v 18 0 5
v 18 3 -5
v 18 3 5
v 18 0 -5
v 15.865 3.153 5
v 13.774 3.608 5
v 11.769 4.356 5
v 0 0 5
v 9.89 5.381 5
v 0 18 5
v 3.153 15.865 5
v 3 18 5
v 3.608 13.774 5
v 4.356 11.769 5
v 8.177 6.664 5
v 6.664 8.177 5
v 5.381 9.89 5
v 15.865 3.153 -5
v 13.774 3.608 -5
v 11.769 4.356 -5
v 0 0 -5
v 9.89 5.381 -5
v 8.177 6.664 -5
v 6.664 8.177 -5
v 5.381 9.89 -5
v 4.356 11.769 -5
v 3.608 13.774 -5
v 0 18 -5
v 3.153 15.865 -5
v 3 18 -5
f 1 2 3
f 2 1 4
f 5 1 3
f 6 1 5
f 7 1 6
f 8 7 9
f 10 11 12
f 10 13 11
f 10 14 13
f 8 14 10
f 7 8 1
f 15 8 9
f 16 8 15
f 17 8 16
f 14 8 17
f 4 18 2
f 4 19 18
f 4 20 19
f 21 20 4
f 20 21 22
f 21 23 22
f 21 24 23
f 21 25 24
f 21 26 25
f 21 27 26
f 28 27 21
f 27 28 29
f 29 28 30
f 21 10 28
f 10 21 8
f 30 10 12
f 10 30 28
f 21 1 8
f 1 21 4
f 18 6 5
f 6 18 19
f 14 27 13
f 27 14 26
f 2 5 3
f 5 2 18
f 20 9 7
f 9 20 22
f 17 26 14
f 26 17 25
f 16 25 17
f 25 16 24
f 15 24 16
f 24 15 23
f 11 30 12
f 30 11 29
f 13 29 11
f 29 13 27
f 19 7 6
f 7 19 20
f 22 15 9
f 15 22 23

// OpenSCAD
// file: attach.scad
//---------------------------------------------------------------
//-- Openscad Attachment library
//-- Attach parts easily. Make your designs more reusable and clean
//---------------------------------------------------------------
//-- This is a component of the obiscad opescad tools by Obijuan
//-- (C) Juan Gonzalez-Gomez (Obijuan)
//-- Sep-2012
//---------------------------------------------------------------
//-- Released under the GPL license
//---------------------------------------------------------------

use <vector.scad>

//--------------------------------------------------------------------
//-- Draw a connector
//-- A connector is defined a 3-tuple that consist of a point
//--- (the attachment point), and axis (the attachment axis) and
//--- an angle the connected part should be rotate around the 
//--  attachment axis
//--
//--- Input parameters:
//--
//--  Connector c = [p , n, ang] where:
//--
//--     p : The attachment point
//--     v : The attachment axis
//--   ang : the angle
//--------------------------------------------------------------------
module connector(c)
{
  //-- Get the three components from the connector
  p = c[0];
  v = c[1];
  ang = c[2];

  //-- Draw the attachment poing
  color("Gray") point(p);

  //-- Draw the attachment axis vector (with a mark)
  translate(p)
    rotate(a=ang, v=v)
    color("Gray") vector(unitv(v)*6, l_arrow=2, mark=true);
}


//-------------------------------------------------------------------------
//--  ATTACH OPERATOR
//--  This operator applies the necesary transformations to the 
//--  child (attachable part) so that it is attached to the main part
//--  
//--  Parameters
//--    a -> Connector of the main part
//--    b -> Connector of the attachable part
//-------------------------------------------------------------------------
module attach(a,b)
{
  //-- Get the data from the connectors
  pos1 = a[0];  //-- Attachment point. Main part
  v    = a[1];  //-- Attachment axis. Main part
  roll = a[2];  //-- Rolling angle
  
  pos2 = b[0];  //-- Attachment point. Attachable part
  vref = b[1];  //-- Atachment axis. Attachable part
                //-- The rolling angle of the attachable part is not used

  //-------- Calculations for the "orientate operator"------
  //-- Calculate the rotation axis
  raxis = cross(vref,v);
    
  //-- Calculate the angle between the vectors
  ang = anglev(vref,v);
  //--------------------------------------------------------.-

  //-- Apply the transformations to the child ---------------------------

  //-- Place the attachable part on the main part attachment point
  translate(pos1)
    //-- Orientate operator. Apply the orientation so that
    //-- both attachment axis are paralell. Also apply the roll angle
    rotate(a=roll, v=v)  rotate(a=ang, v=raxis)
      //-- Attachable part to the origin
      translate(-pos2)
	child(0); 
}


//--------------------------------------------------------------------
//---   An example of the attach operator
//---  
//---  There are two parts: the main body and an arm
//---  They both are cubes (for simplicity)
//---
//--   In the main body there are 2 connectors defined, so that
//--  the arm can be attached to any of them (or both if you like)
//------------------------------------------------------------------

//-- In the debug mode the connectors and additional information
//-- are shown
debug=true;

//-- Define the Main part: A cube
//-- Two attachment points are defined: one on the top, another in the
//--- left side
size = [10,10,10];

//-- Connectors defined:

//--     Att. point       Att. Axis  Roll
c1 = [ [0,0,size[2]/2],  [0,0,1],     20];  //-- Connector on the top
c2 = [ [-size[0]/2,0,0], [-1,0,0],    90];  //-- Connector on the left


//-- Draw the main part along with the connectors (for debugging)
cube(size,center=true);

//-- In debug mode: Draw the main part connectors!
if (debug) {
  connector(c1);
  connector(c2);
}

//-- Define the Attachable part. It is another cube, with one connector
asize = [5,20,3];
a = [ [0,asize[1]/2-3,-asize[2]/2], [0,0,1], 0  ];


//-- Do the attach!
//-- Just change c1 by c2 to attach the part to the other 
//-- connector. Super-easy!! :-)
//-- Modify the c1 and c2 roll angle for rotating the attachable
//--  part to the desired orientation
attach(c1,a)
  //-- This is the attachable part! 
  union() {
    cube(asize,center=true);  //-- The part

    //-- In debug mode show additional info:
    if (debug) {
      frame(l=10);    //-- The part frame of reference.
      connector(a);   //-- Show the part connector
    }
  };

  
// main file
//---------------------------------------------------------------
//-- Openscad Bevel library
//-- Bevel the edges or add buttress to your parts!
//---------------------------------------------------------------
//-- This is a component of the obiscad opescad tools by Obijuan
//-- (C) Juan Gonzalez-Gomez (Obijuan)
//-- Sep-2012
//---------------------------------------------------------------
//-- Released under the GPL license
//---------------------------------------------------------------
use <vector.scad>
use <attach.scad>

//-----------------------------------------------------------------
//- Rotate a vector an angle teta around the axis given by the
//-- unit vector k
//-----------------------------------------------------------------
function Rot_axis_ang(p,k,teta) =
  p*cos(teta) + cross(k,p*sin(teta)) + k*dot(k,p)*(1-cos(teta));

//-- Transformation defined by rotating vfrom vector to vto
//-- It is applied to vector v
//-- It returns the transformed vector
function Tovector(vfrom, vto, v) = 
   Rot_axis_ang(v, unitv(cross(vfrom,vto)), anglev(vfrom,vto));

//-- Auxiliary function for extending a vector of 3 components to 4
function ev(v,c=0) = [v[0], v[1], v[2], c];

//-- Calculate the determinant of a matrix given by 3 row vectors
function det(a,b,c) = 
   a[0]*(b[1]*c[2]-b[2]*c[1])
 - a[1]*(b[0]*c[2]-b[2]*c[0])  
 + a[2]*(b[0]*c[1]-b[1]*c[0]);


//-- Sign function. It only returns 2 values: -1 when x is negative,
//-- or 1 when x=0 or x>0
function sign2(x) = sign(x)+1 - abs(sign(x));

//--------------------------------------------------------------------
//-- Beveled concave corner
//-- NOT AN INTERFACE MODULE (The user should call bconcave_corner instead)
//--
//-- Parameters:
//--   * cr: Corner radius
//--   * cres: Corner resolution
//--   * l: Length
//-    * th: Thickness
//--------------------------------------------------------------------
module bconcave_corner_aux(cr,cres,l,th)
{
  
  //-- vector for translating the  main cube
  //-- so that the top rigth corner is on the origin
  v1 = -[(cr+th)/2, (cr+th)/2, 0];

  //-- The part frame of reference is on the
  //-- internal corner
  v2 = [cr,cr,0];

  //-- Locate the frame of ref. in the internal
  //-- corner
  translate(v2)
  difference() {

    //-- Main cube for doing the corner
    translate(v1)
        //color("yellow",0.5)
        cube([cr+th, cr+th, l],center=true);
 
    //-- Cylinder used for beveling...
    cylinder(r=cr, h=l+1, center=true, $fn=4*(cres+1));
  }
}


//-----------------------------------------------------------------------------
//-- API MODULE
//--
//-- Beveled concave corner
//--
//-- Parameters:
//--   * cr: Corner radius
//--   * cres: Corner resolution
//--   * l: Length
//-    * th: Thickness
//--   * ext_corner: Where the origin is locate. By default it is located
//--       in the internal corner (concave zone). If true, 
//--       it will be in the external corner (convex zone)
//----------------------------------------------------------------------------
module bconcave_corner(cr=1,cres=4,th=1,l=10,ext_corner=false)
{
  //-- Locate the origin in the exterior edge
  if (ext_corner==true)
    translate([th,th,0]) 
      bconcave_corner_aux(cr,cres,l,th);
  else
     //-- Locate the origin in the interior edge
     translate([0.01, 0.01,0])
       bconcave_corner_aux(cr,cres,l,th);
}

//----------------------------------------------------------------------
//-- Auxiliary module (NOT FOR THE USER!)
//-- It is and standar "attach", particularized for placing concave
//-- corners
//----------------------------------------------------------------------
module bconcave_corner_attach_final(
        cfrom,  //-- Origin connector
        cto,    //-- Target connector
        cr,
        cres,
        l,
        th,
        ext_corner)
{
 
  //-- This block represent an attach operation
  //-- It is equivalent to:  attach(cto,cfrom)
  translate(cto[0])
    rotate(a=cto[2], v=cto[1])
      rotate(a=anglev(cfrom[1],cto[1]), 
             v=cross(cfrom[1],cto[1]) )
        translate(-cfrom[0]) 

  //-- Place the concave corner (along with some debug information)
  union() {
    //color("Blue")
    //connector(cfrom);
    //connector([cfrom[0],cnormal_v,0]);
    bconcave_corner(cr=cr,
             cres=cres, 
             l=l,
             th=th,
             ext_corner=ext_corner);
  }
}


//-------------------------------------------------------------------------
//-- Auxiliary module (NOT FOR THE USER!)
//-- It is the general module for performing the bconcave corner attach
//-- All the parameters should be passed to it
//--
//--  External connectors are where de concave corner will be placed. They
//--  are provided by the user
//--
//--  Internal connectors refers to the connectors of the concave corner
//--
//--  Then an attach between the internal and external connectors is done
//-------------------------------------------------------------------------
module bconcave_corner_attach_aux(

         //-- External connectors
         edge_c, 
         normal_c,

         //-- Internal connectors
         iedge_c,
         inormal_c,

	 //-- Other params
         cr,
         cres,
         th,
         l,
         ext_corner)

{
  //-- Get the Corner vectors from the internal connectors
  cedge_v = iedge_c[1];         //-- Corner edge vector
  cnormal_v = inormal_c[1];     //-- Corner normal vector

  //-- Get the vector paralell and normal to the edge
  //-- From the external connectors
  edge_v = edge_c[1];      //-- Edge verctor
  enormal_v = normal_c[1]; //-- Edge normal vector

  //---------------------------------------------------------------
  //-- For doing a correct attach, first the roll angle for the  
  //-- external connector should be calculated. It determines the
  //-- orientation of the concave corner around the edge vector
  //--
  //-- This orientation is calculated using the edge normal vectors
  //-- that bisec the corner
  //--
  //-- There are 2 different cases: depending on the relative angle
  //-- between the internal and external edges. They can be parallel
  //-- or not
  //-----------------------------------------------------------------
  //-- The roll angle has two components: the value and the sign

  //-- Calculate the sign of the rotation (the sign of roll)
  s=sign2(det(cnormal_v,enormal_v,edge_v));

  //-- Calculate the roll when the edges are paralell
  rollp = s*anglev(cnormal_v, enormal_v);

  //-- Calculate the roll in the general case
  Tcnormal_v = Tovector(cedge_v, edge_v, cnormal_v);
  rollg=s*anglev(Tcnormal_v, enormal_v);

  //-- For the paralell case... use rollp
  if (mod(cross(cedge_v,edge_v))==0) {
    //echo("Paralell");

     //-- Place the concave bevel corner!
     bconcave_corner_attach_final(
       cfrom = [[0,0,0],   cedge_v,   0],
       cto   = [edge_c[0], edge_c[1], rollp],
       cr    = cr,
       cres  = cres,
       l     = l,
       th    = th,
       ext_corner = ext_corner);
  }

  //-- For the general case, use rollg
  else {
    //echo("not paralell");

     //-- Place the concave bevel corner!
     bconcave_corner_attach_final(
       cfrom = [[0,0,0],   cedge_v,   0],
       cto   = [edge_c[0], edge_c[1], rollg],
       cr    = cr,
       cres  = cres,
       l     = l,
       th    = th,
       ext_corner = ext_corner);
  }
}

//---------------------------------------------------------------------------
//-- API MODULE
//--
//--  Bevel an edge. A concave corner is located so that the calling 
//--  module can easily perform a difference() operation
//--
//--  Two connectors are needed:
//--    * edge_c   : Connector located on the edge, paralell to the edge
//--    * normal_c : Connector located on the same point than edge_c 
//--                 pointing to the internal corner part, in the direction
//--                 of the corner bisector
//--    * cr        : Corner radius
//--    * cres      : Corner resolution
//--    * l         : Corner length
//--------------------------------------------------------------------------  
module bevel(
           edge_c, 
           normal_c,
           cr=3,
           cres=3,
           l=5)
{

  //-- Call the general module with the correct internal connectors
  bconcave_corner_attach_aux(

         //-- External connectors
         edge_c   = edge_c,
         normal_c = normal_c,

	 //-- Internal connectors 
         iedge_c   = [[0,0,0], unitv([0,0,1]), 0],
         inormal_c = [[0,0,0], [-1,-1,0]       , 0],

         //-- The other params
         cr=cr,
         cres=cres,
         l=l,
         th=1,
         ext_corner=false);
}


//---------------------------------------------------------------------------
//-- API MODULE
//--
//--  Attach a Beveled concave corner
//--  Two connectors are needed:
//--    * edge_c   : Connector located on the edge, paralell to the edge
//--    * normal_c : Connector located on the same point than edge_c 
//--                 pointing to the internal corner part, in the direction
//--                 of the corner bisector
//--    * cr        : Corner radius
//--    * cres      : Corner resolution
//--    * l         : Corner length
//--    * th        : Corner thickness (not visible when ext_corner=false)
//--    * ext_corner: If the exterior corner is used as a reference
//--------------------------------------------------------------------------  
module bconcave_corner_attach(
           edge_c, 
           normal_c,
           cr=3,
           cres=3,
           l=5, 
           th=1,
           ext_corner=false)
{

  //-- Call the general module with the correct internal connectors
  bconcave_corner_attach_aux(

         //-- External connectors
         edge_c   = edge_c,
         normal_c = normal_c,

	 //-- Internal connectors 
         iedge_c   = [[0,0,0], unitv([0,0,1]), 0],
         inormal_c = [[0,0,0], [1,1,0]       , 0],

         //-- The other params
         cr=cr,
         cres=cres,
         l=l,
         th=th,
         ext_corner=ext_corner);

}
  
//-----------------------------------------------------------
//---   TEST MODULES
//-----------------------------------------------------------

//-----------------------------------------------------------------
//--  Testing the Bevel operator... All the 12 edges of a cube
//--  are beveled. All the cases are covered, so it is a good
//--  test for finding bugs!
//----------------------------------------------------------------
module Test1_beveled_cube()
{
  //-------- Main object
  size=[30,30,30];


  //-- Define all the edges connectors
  ec1 = [[size[0]/2, 0,size[2]/2], [0,1,0], 0];
  en1 = [ec1[0],                   [1,0,1], 0];

  ec2 = [[-size[0]/2, 0,size[2]/2], [0,1,0], 0];
  en2 = [ec2[0],                   [-1,0,1], 0];

  ec3 = [[-size[0]/2, 0,-size[2]/2], [0,1,0], 0];
  en3 = [ec3[0],                   [-1,0,-1], 0];

  ec4 = [[size[0]/2, 0,-size[2]/2], [0,1,0], 0];
  en4 = [ec4[0],                   [1,0,-1], 0];

  ec5 = [[0, size[0]/2,size[2]/2], [1,0,0], 0];
  en5 = [ec5[0],                   [0,1,1], 0];

  ec6 = [[0, -size[0]/2,size[2]/2], [1,0,0], 0];
  en6 = [ec6[0],                   [0,-1,1], 0];

  ec7 = [[0, -size[0]/2,-size[2]/2], [1,0,0], 0];
  en7 = [ec7[0],                   [0,-1,-1], 0];

  ec8 = [[0, size[0]/2,-size[2]/2], [1,0,0], 0];
  en8 = [ec8[0],                    [0,1,-1], 0];

  ec9 = [[size[2]/2, size[0]/2,0 ], [0,0,1], 0];
  en9 = [ec9[0],                    [1,1,0], 0];

  ec10 = [[size[2]/2, -size[0]/2,0 ], [0,0,1], 0];
  en10 = [ec10[0],                    [1,-1,0], 0];

  ec11 = [[-size[2]/2, -size[0]/2,0 ], [0,0,1], 0];
  en11 = [ec11[0],                    [-1,-1,0], 0];

  ec12 = [[-size[2]/2, size[0]/2,0 ], [0,0,1], 0];
  en12 = [ec12[0],                    [-1,1,0], 0];


  //-- for Debuging... Show a specefic connector
  *connector(ec12);
  *connector(en12);

  //-- Parameters for all the beveled edges
  //-- It can be changed for testing
  cr=2;
  cres=0;

  //-- Remove from the main cube the concave corner parts
  difference() {

    //-- Draw the main cube
    cube(size,center=true); 

    //-- Attach the concave corners for beveling!
    bevel(ec1,en1,cr=cr,cres=0, l=size[1]+2);
    bevel(ec2,en2,cr=cr,cres=0, l=size[1]+2);
    bevel(ec3,en3,cr=cr,cres=0, l=size[1]+2);
    bevel(ec4,en4,cr=cr,cres=0, l=size[1]+2);

    bevel(ec5,en5,cr=cr,cres=0, l=size[0]+2);
    bevel(ec6,en6,cr=cr,cres=0, l=size[0]+2);
    bevel(ec7,en7,cr=cr,cres=0, l=size[0]+2);
    bevel(ec8,en8,cr=cr,cres=0, l=size[0]+2);

    bevel(ec9,en9,cr=cr,cres=0, l=size[0]+2);
    bevel(ec10,en10,cr=cr,cres=0, l=size[0]+2);
    bevel(ec11,en11,cr=cr,cres=0, l=size[0]+2);
    bevel(ec12,en12,cr=cr,cres=0, l=size[0]+2);

  }
}

//----------------------------------------------------------------
//-- Testing the bconcave_corner_attach operator
//-- It is used for adding buttress between two ortogonal parts
//----------------------------------------------------------------
module Test2_buttress()
{
  size=[30,30,30];
  th=3;
  l=2;
  cr = 6;
 

  //-- A cross. It divides the space in 4 quadrants
  difference() {  
    cube(size,center=true);
    translate([size[0]/4 + th/2, 0, size[0]/4 + th/2])
      cube([size[0]/2, size[1]+2, size[2]/2],center=true);

    translate([-size[0]/4 - th/2, 0, size[0]/4 + th/2])
      cube([size[0]/2, size[1]+2, size[2]/2],center=true);

    translate([-size[0]/4 - th/2, 0, -size[0]/4 - th/2])
      cube([size[0]/2, size[1]+2, size[2]/2],center=true);

    translate([size[0]/4 + th/2, 0, -size[0]/4 - th/2])
      cube([size[0]/2, size[1]+2, size[2]/2],center=true);
  }

  ec1 = [[th/2, size[1]/2-l/2, th/2], [0,1,0], 0];
  en1 = [ec1[0],[1,0,1],0];

  ec2 = [[th/2, -size[1]/2+l/2, th/2], [0,1,0], 0];
  en2 = [ec2[0],[1,0,1],0];

  ec3 = [[-th/2, 0, th/2], [0,1,0], 0];
  en3 = [ec3[0],[-1,0,1],0];

  ec4 = [[-th/2, 0, -th/2], [0,1,0], 0];
  en4 = [ec4[0],[-1,0,-1],0]; 

  ec5 = [[th/2, 0, -th/2], [0,1,0], 0];
  en5 = [ec5[0],[1,0,-1],0]; 

  *connector(ec5);
  *connector(en5);
 
  //-- quadrant 1:  two buttress
  bconcave_corner_attach(ec1,en1,cr, l=l, cres=0);
  bconcave_corner_attach(ec2,en2,cr, l=l, cres=0);
  
  //-- quadrant 2:  one bit buttress
  bconcave_corner_attach(ec3,en3,cr=3, l=size[1], cres=0);

  //-- quadrant 3: a Rounded buttress
  bconcave_corner_attach(ec4,en4,cr=8, l=size[1], cres=5);

  //-- Quadrant 4: A rounded buttress in the middle
  bconcave_corner_attach(ec5,en5,cr=8, l=size[1]/3, cres=5);

}

//-------------------------------------------------------------------
//--   TESTS
//-------------------------------------------------------------------

//-- example 1: A beveled concave corner
bconcave_corner(cr=15, cres=10, l=10, th=3, ext_corner=true);

//-- Example 2: Testing the bevel() operator
//Test1_beveled_cube();

//-- Example 3: Testing the bconcave_corner_attach() operator
//Test2_buttress();
